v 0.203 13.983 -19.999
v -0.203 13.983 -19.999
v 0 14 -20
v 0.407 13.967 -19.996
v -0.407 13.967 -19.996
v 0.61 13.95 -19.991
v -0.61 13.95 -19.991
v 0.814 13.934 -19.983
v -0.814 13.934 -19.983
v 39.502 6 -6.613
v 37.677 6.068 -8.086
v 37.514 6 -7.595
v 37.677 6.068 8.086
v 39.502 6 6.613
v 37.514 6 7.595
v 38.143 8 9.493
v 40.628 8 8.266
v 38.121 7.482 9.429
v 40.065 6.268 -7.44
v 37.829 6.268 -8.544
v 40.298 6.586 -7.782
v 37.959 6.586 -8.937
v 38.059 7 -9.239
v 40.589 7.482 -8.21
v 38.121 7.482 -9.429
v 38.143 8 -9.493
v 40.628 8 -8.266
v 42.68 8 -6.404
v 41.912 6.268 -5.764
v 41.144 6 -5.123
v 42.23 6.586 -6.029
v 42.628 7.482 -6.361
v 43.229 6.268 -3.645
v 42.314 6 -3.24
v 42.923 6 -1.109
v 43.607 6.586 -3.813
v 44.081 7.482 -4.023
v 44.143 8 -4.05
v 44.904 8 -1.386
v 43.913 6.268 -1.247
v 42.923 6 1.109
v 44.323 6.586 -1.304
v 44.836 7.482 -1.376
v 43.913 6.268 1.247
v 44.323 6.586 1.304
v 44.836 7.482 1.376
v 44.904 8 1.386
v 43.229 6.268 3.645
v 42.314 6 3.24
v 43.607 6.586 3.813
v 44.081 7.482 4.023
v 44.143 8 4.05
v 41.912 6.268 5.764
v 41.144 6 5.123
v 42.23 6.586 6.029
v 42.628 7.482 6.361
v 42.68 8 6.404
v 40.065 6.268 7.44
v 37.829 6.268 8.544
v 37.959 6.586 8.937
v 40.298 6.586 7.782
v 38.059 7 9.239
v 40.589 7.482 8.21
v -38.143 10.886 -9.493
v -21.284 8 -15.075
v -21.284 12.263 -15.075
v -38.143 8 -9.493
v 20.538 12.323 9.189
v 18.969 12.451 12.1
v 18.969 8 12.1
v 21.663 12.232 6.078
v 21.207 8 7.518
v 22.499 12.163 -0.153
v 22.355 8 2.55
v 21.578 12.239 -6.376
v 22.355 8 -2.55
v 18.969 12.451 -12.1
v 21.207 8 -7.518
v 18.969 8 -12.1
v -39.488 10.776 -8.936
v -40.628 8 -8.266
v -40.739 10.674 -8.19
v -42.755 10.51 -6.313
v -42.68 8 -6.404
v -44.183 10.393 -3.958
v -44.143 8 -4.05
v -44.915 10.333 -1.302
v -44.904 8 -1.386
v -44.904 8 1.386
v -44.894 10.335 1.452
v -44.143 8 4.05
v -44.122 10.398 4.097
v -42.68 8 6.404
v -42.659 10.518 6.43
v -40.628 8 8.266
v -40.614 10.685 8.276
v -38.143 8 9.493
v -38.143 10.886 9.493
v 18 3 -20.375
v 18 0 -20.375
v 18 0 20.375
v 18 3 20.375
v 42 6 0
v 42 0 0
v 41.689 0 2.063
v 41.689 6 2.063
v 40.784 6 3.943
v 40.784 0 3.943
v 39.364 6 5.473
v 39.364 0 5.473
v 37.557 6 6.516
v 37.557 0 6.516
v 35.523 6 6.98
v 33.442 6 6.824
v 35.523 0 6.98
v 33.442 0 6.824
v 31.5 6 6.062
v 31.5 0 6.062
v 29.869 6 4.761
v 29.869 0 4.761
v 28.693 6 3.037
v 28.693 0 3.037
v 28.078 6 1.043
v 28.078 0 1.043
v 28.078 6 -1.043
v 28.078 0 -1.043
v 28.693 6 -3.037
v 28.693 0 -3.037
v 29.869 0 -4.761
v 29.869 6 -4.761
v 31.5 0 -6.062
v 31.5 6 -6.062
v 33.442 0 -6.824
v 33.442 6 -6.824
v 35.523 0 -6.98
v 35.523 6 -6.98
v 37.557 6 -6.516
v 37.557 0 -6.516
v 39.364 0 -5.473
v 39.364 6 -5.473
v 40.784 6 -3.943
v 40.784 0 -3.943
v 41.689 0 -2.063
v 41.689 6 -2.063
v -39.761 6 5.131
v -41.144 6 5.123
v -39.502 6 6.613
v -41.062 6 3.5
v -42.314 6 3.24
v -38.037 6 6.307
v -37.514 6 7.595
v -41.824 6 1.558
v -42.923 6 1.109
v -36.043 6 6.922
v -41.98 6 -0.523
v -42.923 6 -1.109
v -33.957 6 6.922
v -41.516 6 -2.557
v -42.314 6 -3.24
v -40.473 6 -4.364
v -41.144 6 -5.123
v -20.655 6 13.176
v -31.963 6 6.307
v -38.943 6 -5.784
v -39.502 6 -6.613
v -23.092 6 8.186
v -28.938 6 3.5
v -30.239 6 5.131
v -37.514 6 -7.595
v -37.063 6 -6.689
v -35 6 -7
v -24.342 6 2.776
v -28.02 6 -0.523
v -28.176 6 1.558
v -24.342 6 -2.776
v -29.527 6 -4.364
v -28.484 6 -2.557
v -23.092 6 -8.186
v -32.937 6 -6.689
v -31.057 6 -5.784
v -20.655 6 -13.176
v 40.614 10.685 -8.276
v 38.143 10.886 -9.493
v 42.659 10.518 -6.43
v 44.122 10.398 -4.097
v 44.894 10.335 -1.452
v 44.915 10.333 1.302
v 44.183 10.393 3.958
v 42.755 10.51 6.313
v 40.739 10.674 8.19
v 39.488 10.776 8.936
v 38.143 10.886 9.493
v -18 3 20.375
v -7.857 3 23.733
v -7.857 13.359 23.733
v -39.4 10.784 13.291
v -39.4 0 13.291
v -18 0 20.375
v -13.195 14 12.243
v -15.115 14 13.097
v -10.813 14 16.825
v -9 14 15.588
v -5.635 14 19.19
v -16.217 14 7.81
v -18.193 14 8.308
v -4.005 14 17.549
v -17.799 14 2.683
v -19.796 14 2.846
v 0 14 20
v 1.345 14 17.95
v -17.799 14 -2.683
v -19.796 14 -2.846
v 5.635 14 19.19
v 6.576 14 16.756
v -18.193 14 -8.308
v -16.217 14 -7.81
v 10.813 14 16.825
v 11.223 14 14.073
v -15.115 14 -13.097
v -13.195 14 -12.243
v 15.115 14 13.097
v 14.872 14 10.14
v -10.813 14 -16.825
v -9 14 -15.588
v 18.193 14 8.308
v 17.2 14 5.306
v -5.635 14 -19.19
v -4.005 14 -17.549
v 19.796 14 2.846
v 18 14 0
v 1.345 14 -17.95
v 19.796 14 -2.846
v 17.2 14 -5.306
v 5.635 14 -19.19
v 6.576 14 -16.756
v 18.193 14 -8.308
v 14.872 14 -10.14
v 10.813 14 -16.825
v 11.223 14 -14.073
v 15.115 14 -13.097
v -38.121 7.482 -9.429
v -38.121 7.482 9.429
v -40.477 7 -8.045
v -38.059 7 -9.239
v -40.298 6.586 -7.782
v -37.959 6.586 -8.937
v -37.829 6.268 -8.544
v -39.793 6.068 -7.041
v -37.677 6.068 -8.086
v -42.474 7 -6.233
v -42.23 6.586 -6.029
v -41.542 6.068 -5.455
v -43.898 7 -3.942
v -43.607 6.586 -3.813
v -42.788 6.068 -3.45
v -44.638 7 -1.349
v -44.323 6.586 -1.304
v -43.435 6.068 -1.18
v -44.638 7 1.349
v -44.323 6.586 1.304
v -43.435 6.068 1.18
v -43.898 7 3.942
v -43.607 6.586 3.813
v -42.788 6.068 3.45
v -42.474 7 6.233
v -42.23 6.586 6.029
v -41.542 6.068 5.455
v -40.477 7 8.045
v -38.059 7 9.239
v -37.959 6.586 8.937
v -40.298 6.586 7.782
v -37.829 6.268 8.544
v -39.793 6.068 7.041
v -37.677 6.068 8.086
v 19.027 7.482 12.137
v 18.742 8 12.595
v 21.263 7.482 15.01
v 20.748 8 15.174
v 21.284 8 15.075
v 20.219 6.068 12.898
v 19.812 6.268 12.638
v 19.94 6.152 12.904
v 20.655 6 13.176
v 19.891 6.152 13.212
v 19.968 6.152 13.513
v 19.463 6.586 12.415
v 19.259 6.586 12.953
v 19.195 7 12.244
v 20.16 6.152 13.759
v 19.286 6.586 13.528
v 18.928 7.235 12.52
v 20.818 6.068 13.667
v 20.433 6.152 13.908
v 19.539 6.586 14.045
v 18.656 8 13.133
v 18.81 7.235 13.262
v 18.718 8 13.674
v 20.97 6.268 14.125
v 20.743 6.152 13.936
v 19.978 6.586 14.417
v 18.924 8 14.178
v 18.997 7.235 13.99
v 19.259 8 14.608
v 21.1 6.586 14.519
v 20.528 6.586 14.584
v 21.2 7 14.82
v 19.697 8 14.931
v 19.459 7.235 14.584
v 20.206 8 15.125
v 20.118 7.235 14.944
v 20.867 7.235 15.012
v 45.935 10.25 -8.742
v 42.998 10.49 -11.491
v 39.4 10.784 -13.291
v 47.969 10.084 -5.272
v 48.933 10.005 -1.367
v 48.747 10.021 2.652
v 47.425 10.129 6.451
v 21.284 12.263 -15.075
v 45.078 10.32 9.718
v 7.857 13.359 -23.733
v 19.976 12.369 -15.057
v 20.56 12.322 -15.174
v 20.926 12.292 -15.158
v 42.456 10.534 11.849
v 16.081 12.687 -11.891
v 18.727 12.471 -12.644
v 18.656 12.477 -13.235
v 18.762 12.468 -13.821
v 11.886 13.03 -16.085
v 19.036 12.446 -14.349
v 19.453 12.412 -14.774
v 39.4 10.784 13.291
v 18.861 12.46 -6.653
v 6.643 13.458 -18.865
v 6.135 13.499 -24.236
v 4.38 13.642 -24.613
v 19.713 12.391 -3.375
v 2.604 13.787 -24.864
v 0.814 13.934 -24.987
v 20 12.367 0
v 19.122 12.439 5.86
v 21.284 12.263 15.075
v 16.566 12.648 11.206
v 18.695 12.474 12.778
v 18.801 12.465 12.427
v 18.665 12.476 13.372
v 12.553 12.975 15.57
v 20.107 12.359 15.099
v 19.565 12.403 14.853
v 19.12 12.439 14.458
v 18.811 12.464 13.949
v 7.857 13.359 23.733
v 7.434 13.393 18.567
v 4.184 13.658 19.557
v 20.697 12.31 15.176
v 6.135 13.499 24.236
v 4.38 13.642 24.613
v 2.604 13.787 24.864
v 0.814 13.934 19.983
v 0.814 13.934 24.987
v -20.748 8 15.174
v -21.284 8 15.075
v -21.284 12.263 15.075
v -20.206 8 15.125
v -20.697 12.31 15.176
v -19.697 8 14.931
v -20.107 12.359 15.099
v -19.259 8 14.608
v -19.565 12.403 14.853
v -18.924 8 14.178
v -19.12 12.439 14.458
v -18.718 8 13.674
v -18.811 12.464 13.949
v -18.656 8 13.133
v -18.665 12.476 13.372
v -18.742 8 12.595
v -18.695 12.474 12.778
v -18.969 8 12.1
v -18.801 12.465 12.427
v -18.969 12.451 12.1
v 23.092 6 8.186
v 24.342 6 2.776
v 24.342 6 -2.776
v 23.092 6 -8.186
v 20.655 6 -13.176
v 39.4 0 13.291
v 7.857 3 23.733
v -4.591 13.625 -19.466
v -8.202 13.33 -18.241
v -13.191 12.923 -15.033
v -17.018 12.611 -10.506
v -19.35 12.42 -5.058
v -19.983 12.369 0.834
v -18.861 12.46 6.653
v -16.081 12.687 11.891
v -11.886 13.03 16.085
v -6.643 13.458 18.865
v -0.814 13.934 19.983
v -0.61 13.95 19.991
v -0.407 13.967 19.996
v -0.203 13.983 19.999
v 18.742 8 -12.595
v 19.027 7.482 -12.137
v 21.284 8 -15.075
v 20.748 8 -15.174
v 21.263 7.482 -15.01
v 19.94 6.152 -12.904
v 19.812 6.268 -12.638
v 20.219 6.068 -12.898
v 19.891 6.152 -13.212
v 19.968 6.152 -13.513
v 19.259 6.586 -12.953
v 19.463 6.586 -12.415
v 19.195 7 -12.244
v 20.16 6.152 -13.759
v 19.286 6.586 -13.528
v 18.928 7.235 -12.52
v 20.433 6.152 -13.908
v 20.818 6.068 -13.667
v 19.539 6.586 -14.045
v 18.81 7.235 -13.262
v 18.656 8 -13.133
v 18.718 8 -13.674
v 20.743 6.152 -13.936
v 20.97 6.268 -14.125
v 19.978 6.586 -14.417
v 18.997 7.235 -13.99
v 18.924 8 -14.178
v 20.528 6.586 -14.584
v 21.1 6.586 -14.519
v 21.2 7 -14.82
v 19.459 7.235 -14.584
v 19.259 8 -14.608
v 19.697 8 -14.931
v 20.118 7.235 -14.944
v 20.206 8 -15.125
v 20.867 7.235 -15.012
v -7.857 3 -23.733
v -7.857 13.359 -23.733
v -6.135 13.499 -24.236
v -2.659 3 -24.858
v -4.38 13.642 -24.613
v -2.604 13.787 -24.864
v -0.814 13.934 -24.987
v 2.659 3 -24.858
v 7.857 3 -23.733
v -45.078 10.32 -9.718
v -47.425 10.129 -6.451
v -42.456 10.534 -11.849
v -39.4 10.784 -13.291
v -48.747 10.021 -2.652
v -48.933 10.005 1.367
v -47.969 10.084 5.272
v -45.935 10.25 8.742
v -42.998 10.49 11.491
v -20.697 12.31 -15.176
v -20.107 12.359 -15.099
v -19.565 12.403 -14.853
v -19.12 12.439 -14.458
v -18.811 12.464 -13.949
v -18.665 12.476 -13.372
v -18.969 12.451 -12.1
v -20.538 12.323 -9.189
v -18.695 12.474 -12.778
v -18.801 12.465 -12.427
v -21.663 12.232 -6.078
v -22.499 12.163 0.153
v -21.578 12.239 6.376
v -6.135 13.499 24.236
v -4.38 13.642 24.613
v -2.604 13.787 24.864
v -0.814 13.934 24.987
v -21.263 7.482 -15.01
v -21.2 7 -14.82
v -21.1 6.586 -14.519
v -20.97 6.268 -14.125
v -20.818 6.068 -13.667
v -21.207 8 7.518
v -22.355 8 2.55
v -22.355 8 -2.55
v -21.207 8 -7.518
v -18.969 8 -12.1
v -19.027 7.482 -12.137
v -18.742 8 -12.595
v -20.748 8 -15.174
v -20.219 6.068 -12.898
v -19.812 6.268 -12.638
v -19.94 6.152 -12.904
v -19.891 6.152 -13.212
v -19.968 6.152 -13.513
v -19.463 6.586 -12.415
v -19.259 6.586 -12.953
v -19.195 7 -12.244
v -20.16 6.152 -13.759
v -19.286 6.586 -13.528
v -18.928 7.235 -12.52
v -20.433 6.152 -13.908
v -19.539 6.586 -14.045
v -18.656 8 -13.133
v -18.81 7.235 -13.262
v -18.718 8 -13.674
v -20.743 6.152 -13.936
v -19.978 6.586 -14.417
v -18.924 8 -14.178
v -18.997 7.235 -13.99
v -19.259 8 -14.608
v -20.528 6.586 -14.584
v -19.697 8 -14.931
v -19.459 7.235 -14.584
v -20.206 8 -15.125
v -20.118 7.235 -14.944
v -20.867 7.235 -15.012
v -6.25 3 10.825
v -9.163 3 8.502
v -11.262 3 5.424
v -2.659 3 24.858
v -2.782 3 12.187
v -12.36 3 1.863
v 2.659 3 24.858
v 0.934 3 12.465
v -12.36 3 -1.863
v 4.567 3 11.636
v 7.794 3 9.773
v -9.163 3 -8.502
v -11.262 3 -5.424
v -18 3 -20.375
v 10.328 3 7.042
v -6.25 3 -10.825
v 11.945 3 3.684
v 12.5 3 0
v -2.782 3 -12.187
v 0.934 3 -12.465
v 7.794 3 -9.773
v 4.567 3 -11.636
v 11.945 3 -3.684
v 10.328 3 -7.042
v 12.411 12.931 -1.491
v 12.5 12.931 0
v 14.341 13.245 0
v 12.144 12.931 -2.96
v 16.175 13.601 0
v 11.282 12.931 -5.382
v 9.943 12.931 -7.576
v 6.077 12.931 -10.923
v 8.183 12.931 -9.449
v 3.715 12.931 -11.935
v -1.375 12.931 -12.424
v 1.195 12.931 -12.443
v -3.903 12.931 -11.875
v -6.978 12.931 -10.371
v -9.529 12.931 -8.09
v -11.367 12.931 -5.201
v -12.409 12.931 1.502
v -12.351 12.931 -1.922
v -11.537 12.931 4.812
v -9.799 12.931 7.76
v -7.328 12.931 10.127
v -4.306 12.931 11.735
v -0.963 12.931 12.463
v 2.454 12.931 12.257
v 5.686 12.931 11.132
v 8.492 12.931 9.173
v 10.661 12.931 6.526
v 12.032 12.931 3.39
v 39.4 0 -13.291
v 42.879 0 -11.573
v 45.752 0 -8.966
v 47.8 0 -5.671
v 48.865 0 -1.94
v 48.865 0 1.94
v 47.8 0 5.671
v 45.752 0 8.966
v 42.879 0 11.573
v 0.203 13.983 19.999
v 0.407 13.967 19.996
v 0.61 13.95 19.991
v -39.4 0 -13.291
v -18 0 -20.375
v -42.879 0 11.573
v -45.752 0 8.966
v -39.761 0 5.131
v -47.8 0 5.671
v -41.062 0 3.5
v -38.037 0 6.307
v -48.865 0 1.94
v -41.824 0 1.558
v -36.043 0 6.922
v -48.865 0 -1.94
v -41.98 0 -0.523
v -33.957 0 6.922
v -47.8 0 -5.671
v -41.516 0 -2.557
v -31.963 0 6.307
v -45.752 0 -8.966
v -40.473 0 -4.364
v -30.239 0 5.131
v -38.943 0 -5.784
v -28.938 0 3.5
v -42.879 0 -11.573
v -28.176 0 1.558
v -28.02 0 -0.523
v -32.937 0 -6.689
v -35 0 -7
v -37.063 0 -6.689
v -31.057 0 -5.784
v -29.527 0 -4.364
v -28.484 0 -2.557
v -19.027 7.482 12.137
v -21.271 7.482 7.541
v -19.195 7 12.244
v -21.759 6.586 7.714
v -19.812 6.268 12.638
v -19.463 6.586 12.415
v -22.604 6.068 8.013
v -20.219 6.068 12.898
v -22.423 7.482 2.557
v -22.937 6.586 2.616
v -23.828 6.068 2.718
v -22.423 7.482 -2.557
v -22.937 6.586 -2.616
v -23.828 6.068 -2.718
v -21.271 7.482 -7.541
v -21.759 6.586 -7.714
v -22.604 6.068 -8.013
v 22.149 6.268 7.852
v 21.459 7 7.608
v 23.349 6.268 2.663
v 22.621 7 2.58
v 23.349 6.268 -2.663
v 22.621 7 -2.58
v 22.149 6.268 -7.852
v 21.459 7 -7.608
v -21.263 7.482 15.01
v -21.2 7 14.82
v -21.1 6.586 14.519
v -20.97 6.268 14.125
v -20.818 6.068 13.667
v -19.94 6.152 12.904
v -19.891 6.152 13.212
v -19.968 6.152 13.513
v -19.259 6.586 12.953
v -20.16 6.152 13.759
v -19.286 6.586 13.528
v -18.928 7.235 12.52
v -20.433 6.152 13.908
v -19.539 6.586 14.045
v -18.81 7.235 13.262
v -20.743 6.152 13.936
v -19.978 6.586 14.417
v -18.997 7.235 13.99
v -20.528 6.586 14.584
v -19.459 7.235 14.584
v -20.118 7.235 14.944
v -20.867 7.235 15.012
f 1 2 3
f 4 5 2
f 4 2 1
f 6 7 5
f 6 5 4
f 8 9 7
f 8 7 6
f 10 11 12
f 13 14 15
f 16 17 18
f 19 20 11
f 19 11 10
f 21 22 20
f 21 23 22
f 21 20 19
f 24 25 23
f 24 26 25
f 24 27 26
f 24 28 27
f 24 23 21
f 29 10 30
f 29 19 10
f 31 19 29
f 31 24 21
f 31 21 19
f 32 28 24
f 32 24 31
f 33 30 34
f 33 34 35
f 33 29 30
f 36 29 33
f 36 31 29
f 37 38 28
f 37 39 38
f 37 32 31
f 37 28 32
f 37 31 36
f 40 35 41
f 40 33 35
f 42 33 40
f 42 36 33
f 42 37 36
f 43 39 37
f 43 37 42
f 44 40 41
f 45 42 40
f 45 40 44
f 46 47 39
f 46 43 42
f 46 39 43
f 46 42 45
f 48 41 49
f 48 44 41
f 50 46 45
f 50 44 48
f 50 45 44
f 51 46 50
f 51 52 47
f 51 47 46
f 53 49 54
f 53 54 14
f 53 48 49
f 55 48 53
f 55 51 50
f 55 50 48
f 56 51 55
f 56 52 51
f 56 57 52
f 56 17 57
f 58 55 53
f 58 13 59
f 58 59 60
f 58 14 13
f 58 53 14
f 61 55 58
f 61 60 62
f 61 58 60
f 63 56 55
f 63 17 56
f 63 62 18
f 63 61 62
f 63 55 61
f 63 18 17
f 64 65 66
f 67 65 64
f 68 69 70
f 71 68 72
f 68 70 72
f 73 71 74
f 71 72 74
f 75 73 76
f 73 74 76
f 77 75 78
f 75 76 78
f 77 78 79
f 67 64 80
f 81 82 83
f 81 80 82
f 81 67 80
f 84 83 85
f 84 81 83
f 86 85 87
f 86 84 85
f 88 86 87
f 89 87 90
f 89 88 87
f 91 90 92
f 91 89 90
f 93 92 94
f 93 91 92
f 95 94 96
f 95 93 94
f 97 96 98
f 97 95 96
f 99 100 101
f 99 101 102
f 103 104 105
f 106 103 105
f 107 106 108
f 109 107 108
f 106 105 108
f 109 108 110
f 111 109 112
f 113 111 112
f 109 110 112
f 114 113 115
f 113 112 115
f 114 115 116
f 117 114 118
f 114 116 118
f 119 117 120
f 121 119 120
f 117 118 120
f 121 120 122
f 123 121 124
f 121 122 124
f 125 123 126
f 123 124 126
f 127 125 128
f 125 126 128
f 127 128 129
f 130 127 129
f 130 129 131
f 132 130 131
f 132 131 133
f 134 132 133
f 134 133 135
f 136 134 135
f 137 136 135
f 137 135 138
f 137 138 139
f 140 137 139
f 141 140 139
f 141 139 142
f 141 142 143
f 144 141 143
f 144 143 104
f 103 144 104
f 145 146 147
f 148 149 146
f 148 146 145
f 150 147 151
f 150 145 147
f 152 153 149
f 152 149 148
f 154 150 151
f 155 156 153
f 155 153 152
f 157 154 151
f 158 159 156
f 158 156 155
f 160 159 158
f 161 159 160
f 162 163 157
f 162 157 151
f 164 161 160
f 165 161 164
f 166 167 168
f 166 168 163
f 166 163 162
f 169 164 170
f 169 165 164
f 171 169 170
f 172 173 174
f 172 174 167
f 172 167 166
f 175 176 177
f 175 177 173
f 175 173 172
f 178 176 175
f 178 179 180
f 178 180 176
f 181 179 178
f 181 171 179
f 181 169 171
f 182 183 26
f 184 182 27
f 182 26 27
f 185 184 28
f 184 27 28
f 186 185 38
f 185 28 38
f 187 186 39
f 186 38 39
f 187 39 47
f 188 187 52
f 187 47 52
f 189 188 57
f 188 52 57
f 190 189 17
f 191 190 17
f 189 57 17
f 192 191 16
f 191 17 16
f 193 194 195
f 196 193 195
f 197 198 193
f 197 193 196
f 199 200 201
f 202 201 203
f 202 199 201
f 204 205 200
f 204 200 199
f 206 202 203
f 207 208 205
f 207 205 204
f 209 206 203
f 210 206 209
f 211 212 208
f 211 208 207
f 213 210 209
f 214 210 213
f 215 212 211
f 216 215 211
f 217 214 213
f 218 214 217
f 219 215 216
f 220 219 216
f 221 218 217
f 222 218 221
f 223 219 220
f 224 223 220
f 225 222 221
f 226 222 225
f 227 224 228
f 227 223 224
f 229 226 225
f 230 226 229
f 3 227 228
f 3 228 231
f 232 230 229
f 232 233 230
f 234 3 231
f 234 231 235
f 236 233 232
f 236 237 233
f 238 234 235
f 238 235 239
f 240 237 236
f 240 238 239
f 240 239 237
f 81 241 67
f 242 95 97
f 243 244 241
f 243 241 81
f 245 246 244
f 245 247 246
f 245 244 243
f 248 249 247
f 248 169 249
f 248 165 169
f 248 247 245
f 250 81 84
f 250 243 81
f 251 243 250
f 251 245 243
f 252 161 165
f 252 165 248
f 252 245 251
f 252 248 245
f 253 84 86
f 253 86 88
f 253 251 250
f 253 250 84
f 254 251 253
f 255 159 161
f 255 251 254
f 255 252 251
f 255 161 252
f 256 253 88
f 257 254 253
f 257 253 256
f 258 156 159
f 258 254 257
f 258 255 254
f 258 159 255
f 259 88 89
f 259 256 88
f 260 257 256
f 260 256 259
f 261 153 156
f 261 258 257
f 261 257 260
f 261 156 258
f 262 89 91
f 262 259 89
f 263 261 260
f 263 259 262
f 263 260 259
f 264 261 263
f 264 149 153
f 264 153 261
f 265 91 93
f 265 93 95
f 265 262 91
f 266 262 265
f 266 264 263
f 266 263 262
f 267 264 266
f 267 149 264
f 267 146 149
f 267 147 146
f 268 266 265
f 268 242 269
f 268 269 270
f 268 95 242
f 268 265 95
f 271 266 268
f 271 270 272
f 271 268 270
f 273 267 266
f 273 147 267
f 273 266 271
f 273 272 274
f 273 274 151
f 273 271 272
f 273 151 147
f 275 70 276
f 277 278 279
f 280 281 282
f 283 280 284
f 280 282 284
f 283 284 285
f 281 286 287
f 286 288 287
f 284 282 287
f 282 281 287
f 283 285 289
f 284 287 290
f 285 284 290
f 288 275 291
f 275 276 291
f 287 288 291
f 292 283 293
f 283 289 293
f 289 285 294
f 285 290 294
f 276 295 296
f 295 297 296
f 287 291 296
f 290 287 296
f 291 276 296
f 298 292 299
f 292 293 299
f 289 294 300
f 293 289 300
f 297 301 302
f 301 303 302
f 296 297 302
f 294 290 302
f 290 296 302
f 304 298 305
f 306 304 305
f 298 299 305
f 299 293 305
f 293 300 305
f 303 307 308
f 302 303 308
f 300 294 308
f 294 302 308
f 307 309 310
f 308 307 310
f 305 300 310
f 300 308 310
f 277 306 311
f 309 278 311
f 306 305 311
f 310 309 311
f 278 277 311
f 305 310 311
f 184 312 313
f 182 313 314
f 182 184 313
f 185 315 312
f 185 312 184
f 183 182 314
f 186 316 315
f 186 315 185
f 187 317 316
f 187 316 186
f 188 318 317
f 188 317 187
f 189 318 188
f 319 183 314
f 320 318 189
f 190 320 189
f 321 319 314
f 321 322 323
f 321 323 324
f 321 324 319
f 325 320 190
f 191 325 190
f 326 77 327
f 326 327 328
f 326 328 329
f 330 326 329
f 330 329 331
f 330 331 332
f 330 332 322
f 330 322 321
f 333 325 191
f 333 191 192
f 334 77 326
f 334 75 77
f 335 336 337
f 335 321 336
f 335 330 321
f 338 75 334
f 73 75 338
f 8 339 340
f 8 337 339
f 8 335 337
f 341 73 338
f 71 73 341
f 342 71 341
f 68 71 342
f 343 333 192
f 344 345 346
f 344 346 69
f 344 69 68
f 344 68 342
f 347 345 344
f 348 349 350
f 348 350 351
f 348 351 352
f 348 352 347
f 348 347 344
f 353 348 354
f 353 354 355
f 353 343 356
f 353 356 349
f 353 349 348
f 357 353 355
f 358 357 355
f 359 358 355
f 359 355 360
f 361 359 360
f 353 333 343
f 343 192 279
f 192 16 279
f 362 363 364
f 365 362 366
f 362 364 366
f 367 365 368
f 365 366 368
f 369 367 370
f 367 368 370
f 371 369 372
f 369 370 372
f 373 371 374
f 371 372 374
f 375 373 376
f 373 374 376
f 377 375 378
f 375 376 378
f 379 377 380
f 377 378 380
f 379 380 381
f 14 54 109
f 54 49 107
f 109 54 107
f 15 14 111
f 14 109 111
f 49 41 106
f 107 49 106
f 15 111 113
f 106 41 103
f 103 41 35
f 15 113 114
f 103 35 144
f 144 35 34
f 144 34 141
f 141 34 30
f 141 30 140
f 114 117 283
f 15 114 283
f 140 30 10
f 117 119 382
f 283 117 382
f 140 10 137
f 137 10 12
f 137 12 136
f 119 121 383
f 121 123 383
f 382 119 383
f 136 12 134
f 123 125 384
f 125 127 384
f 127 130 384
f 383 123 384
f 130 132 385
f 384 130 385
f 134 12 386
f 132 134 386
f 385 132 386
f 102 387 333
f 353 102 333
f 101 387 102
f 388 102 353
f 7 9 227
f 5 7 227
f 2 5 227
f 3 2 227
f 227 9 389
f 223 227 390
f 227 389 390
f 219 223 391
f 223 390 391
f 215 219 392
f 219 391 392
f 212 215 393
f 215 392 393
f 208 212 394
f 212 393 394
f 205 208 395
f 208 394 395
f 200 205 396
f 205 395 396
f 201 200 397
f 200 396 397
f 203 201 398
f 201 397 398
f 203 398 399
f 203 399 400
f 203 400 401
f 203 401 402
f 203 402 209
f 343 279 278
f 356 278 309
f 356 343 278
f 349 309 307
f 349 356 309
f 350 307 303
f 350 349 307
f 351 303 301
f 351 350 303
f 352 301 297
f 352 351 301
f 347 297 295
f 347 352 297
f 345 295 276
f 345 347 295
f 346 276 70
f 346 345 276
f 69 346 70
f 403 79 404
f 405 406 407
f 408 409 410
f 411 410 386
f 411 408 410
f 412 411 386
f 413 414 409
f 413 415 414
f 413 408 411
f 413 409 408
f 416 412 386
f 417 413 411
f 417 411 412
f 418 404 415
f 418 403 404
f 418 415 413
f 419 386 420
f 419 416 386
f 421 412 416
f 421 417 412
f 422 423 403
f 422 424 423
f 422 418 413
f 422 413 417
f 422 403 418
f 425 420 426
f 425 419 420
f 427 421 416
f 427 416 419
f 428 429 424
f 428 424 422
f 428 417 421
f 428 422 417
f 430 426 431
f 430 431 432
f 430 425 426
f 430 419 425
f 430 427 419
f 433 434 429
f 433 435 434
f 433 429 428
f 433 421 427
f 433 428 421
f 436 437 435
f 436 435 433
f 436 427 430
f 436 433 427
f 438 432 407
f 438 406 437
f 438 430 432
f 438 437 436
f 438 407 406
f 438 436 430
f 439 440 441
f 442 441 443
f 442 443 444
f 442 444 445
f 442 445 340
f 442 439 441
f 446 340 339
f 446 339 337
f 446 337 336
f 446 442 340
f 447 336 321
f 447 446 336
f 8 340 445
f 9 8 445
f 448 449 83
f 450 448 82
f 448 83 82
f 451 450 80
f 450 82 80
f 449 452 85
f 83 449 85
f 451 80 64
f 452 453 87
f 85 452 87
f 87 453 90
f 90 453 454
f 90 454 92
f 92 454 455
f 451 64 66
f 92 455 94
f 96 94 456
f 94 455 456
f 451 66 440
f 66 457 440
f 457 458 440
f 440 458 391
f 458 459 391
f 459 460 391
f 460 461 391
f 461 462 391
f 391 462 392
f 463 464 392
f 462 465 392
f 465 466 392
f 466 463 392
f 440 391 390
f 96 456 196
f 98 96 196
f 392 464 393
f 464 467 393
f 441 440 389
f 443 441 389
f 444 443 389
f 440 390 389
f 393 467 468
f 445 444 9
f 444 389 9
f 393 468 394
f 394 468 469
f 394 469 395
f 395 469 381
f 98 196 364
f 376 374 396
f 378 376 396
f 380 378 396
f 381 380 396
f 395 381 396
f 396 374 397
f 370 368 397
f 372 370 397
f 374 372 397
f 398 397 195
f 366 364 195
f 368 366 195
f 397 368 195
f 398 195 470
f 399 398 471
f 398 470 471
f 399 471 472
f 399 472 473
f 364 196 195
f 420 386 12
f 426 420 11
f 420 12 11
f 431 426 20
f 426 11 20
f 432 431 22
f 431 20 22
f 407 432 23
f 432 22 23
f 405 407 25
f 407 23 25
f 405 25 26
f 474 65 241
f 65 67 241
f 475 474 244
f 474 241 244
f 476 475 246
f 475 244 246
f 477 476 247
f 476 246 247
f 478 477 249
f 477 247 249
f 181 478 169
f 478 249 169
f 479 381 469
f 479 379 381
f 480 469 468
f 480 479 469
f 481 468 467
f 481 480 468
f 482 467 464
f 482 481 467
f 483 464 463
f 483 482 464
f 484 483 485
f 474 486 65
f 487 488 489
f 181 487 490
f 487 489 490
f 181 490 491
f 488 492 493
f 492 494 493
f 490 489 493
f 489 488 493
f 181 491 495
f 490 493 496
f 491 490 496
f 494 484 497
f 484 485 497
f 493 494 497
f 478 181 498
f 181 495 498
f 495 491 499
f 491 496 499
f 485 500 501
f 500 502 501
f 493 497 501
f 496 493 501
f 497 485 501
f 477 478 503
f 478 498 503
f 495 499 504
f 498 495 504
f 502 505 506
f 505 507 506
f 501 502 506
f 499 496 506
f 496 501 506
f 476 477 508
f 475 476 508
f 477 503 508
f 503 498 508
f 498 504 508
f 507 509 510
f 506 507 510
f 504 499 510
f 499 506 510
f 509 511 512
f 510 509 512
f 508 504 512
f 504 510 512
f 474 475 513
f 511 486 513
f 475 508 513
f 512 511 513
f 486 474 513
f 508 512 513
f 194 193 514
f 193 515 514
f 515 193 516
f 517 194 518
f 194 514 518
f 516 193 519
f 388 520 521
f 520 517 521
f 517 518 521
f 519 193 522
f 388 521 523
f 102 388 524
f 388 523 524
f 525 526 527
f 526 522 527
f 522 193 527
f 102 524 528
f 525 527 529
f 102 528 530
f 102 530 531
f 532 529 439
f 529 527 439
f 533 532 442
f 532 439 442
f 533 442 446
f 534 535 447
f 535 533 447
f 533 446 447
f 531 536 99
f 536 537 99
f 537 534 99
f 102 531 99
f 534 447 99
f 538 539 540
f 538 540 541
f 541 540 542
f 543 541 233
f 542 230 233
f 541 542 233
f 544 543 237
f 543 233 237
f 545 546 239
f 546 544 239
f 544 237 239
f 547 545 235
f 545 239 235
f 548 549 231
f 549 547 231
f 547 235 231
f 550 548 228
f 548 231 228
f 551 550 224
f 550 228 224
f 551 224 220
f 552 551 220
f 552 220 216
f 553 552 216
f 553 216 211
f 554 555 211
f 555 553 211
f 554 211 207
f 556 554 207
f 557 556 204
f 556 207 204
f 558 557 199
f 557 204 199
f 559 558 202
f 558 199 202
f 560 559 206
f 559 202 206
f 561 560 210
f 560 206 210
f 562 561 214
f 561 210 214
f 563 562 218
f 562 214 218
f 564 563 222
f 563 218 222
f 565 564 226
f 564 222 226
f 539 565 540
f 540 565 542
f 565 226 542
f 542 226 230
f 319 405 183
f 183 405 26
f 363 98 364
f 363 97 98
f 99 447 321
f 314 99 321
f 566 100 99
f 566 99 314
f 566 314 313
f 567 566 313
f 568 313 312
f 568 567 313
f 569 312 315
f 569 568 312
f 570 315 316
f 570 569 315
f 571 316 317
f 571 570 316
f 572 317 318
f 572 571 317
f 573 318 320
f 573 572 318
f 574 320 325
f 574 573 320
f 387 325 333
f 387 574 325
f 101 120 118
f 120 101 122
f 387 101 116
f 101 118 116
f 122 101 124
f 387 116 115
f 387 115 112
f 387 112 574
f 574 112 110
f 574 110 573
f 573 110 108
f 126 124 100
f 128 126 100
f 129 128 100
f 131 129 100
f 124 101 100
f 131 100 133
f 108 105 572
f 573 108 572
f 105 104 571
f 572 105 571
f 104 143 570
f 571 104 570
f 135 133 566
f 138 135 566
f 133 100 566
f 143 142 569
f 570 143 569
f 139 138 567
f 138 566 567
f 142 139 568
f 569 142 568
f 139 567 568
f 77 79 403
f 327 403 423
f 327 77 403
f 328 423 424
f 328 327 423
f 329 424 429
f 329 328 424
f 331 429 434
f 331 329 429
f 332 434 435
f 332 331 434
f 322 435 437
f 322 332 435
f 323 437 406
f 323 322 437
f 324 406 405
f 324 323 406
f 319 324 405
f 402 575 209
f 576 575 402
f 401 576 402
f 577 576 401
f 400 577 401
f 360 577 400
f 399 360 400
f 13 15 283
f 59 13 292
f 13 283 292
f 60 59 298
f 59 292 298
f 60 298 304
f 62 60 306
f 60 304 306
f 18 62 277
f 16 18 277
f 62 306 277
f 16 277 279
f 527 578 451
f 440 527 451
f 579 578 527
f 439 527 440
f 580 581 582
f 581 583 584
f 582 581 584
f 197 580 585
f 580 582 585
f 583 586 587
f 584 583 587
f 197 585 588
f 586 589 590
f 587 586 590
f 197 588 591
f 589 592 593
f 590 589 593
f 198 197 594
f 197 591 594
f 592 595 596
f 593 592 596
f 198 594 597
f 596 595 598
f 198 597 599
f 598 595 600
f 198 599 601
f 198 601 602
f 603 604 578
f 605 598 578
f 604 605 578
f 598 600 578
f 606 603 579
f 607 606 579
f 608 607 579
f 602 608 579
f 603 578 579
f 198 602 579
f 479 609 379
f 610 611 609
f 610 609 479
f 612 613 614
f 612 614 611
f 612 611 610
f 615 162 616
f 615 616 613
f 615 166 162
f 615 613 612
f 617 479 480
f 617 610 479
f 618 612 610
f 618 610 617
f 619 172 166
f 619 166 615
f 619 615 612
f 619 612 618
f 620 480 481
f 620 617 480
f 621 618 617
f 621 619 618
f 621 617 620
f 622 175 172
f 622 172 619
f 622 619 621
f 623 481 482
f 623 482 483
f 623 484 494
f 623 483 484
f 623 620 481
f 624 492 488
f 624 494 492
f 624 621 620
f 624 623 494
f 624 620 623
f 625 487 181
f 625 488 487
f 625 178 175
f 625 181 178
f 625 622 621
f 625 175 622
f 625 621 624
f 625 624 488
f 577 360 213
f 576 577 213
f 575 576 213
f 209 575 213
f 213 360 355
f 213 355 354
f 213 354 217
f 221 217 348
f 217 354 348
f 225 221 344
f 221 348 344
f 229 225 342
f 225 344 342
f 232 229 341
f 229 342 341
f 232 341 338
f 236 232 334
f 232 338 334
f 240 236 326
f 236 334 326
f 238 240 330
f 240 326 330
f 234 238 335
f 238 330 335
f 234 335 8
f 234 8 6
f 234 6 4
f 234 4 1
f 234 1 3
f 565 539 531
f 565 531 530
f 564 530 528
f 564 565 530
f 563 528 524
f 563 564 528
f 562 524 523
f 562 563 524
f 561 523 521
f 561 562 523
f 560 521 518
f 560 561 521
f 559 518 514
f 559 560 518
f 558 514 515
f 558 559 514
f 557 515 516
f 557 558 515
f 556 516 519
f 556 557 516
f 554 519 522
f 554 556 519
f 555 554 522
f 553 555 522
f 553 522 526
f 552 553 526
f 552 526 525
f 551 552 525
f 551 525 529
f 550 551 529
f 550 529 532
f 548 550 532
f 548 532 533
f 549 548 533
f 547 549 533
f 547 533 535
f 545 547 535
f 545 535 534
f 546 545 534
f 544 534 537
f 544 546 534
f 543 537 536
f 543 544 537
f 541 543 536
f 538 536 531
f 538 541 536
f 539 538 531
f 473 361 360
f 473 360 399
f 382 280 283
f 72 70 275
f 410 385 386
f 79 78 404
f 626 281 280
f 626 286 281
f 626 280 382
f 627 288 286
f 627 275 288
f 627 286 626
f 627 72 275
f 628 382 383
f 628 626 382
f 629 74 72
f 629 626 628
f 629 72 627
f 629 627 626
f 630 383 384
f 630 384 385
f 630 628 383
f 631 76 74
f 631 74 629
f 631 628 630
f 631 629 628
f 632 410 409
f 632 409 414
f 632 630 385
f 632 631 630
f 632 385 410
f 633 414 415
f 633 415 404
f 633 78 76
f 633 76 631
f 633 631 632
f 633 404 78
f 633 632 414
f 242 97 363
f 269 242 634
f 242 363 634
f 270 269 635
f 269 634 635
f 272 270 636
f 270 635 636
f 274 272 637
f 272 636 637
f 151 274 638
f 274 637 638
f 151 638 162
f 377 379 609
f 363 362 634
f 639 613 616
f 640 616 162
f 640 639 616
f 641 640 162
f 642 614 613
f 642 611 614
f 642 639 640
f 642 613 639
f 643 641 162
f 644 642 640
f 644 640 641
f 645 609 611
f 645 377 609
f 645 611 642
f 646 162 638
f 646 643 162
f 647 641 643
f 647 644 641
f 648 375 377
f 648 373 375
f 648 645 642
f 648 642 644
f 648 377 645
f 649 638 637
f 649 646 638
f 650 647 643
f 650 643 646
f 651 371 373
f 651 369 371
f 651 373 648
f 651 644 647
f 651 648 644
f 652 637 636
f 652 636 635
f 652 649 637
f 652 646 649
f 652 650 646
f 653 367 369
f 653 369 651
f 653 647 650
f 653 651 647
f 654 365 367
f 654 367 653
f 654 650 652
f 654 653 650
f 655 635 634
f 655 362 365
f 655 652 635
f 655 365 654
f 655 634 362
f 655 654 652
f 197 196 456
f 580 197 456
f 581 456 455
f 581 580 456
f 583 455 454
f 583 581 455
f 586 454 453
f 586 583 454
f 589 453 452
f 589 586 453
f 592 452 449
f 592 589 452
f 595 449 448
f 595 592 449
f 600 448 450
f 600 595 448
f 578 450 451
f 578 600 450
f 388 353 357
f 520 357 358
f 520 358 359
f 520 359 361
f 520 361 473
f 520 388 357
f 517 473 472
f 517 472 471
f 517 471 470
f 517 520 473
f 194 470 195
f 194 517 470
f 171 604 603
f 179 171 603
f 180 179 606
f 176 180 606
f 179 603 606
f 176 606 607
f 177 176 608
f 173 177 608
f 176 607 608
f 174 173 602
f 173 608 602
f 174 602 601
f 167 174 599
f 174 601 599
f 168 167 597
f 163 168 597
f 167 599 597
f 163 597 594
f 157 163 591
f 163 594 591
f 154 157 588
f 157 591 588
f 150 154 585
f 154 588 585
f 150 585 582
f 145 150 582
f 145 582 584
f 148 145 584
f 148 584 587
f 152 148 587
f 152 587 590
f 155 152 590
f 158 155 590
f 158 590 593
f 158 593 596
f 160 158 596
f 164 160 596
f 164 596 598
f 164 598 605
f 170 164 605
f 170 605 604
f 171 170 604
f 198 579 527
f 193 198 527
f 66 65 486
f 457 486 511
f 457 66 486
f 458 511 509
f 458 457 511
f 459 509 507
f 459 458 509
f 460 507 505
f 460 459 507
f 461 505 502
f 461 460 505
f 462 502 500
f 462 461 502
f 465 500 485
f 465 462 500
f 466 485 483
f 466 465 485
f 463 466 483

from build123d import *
from build123d.topology import SkipClean

# Parameters (mm, degrees)
EXTRUDE_1_DEPTH          = 14
CUT_EXTRUDE_1_DEPTH      = 57.762663785
SKETCH_4_R               = 7
CUT_EXTRUDE_2_DEPTH      = 57.762663785
CUT_EXTRUDE_START        = 6
CUT_EXTRUDE_3_DEPTH      = 51.762663785
SKETCH_7_R               = 20
EXTRUDE_2_DEPTH          = 14
CUT_EXTRUDE_4_DEPTH      = 57.762663785
CUT_EXTRUDE_4_DEPTH_BACK = 57.762663785
SKETCH_6_W               = 36
SKETCH_6_H               = 3
CUT_EXTRUDE_5_DEPTH      = 57.098128311
CUT_EXTRUDE_5_DEPTH_BACK = 57.098128311
SKETCH_9_R               = 12.5
FILLET_1_R               = 10
FILLET_4_R               = 2


with BuildPart() as part:
    # 草图2 → 凸台-拉伸1 (new body)
    with BuildSketch(Plane(origin=(0, 0, 0), x_dir=(1, 0, 0), z_dir=(0, 1, 0))):
        with BuildLine():
            Line((7.857142857, 23.733211037), (39.4, 13.290598181))
            ThreePointArc((39.4, 13.290598181), (49, 0), (39.4, -13.290598181))
            Line((39.4, -13.290598181), (7.857142857, -23.733211037))
            ThreePointArc((7.857142857, -23.733211037), (0, -25), (-7.857142857, -23.733211037))
            Line((-7.857142857, -23.733211037), (-39.4, -13.290598181))
            ThreePointArc((-39.4, -13.290598181), (-49, 0), (-39.4, 13.290598181))
            Line((-39.4, 13.290598181), (-7.857142857, 23.733211037))
            ThreePointArc((-7.857142857, 23.733211037), (0, 25), (7.857142857, 23.733211037))
        make_face()
    extrude(amount=EXTRUDE_1_DEPTH)

    # 草图3 → 切除-拉伸1 (cut, symmetric)
    with BuildSketch(Plane.XY):
        Polygon((-255.331422272, -6.84338141), (-49, 10), (0, 14), (206.331422272, 30.84338141), (172.644659452, 443.506225953), (-289.018185091, 405.819463133), align=None)
    cut_extrude_1 = extrude(amount=CUT_EXTRUDE_1_DEPTH, both=True, mode=Mode.SUBTRACT)

    # 镜向1: 切除-拉伸1 across plane
    add(cut_extrude_1.mirror(Plane(origin=(0, 0, 0), x_dir=(0, 0, 1), z_dir=(1, 0, 0))), mode=Mode.SUBTRACT)

    # 草图4 → 切除-拉伸2 (cut, through all)
    with BuildSketch(Plane.XZ):
        with Locations(Location((-35, 0, 0), (0, 0, 270))):
            Circle(SKETCH_4_R)
        with Locations((35, 0)):
            Circle(SKETCH_4_R)
    extrude(amount=-CUT_EXTRUDE_2_DEPTH, mode=Mode.SUBTRACT)

    # 草图5 → 切除-拉伸3 (cut, through all)
    with BuildSketch(Plane(origin=(0, 0, 0), x_dir=(1, 0, 0), z_dir=(0, 1, 0)).offset(CUT_EXTRUDE_START)):
        with BuildLine():
            Line((-38.142857143, -9.493284415), (-14.26843517, -17.397176719))
            ThreePointArc((-14.26843517, -17.397176719), (-22.5, 0), (-14.26843517, 17.397176719))
            Line((-14.26843517, 17.397176719), (-38.142857143, 9.493284415))
            ThreePointArc((-38.142857143, 9.493284415), (-45, 0), (-38.142857143, -9.493284415))
        make_face()
    cut_extrude_3 = extrude(amount=CUT_EXTRUDE_3_DEPTH, mode=Mode.SUBTRACT)

    # 镜向2: 切除-拉伸3 across plane
    add(cut_extrude_3.mirror(Plane(origin=(0, 0, 0), x_dir=(0, 0, 1), z_dir=(1, 0, 0))), mode=Mode.SUBTRACT)

    # 草图7 → 凸台-拉伸2 (add)
    with BuildSketch(Plane(origin=(0, 0, 0), x_dir=(1, 0, 0), z_dir=(0, 1, 0))):
        Circle(SKETCH_7_R)
    extrude(amount=EXTRUDE_2_DEPTH)

    # 草图6 → 切除-拉伸4 (cut, two sides: drawn at the far end of the back side and taken through both)
    with BuildSketch(Plane.XY.offset(-CUT_EXTRUDE_4_DEPTH_BACK)):
        with Locations((0, 1.5)):
            Rectangle(SKETCH_6_W, SKETCH_6_H)
    extrude(amount=CUT_EXTRUDE_4_DEPTH + CUT_EXTRUDE_4_DEPTH_BACK, mode=Mode.SUBTRACT)

    # 草图8 → 切除-旋转3 (revolve, cut)
    with SkipClean():  # the faces are left unmerged after this step: merging them gives an invalid solid
        with BuildSketch(Plane.XY):
            with BuildLine():
                ThreePointArc((0, 11.94870108), (9.058253519, 12.463180114), (18, 14))
                Line((18, 14), (0, 14))
                Line((0, 14), (0, 11.94870108))
            make_face()
            with BuildLine():
                Line((0, 11.94870108), (0, 14))
                Line((0, 14), (-18, 14))
                ThreePointArc((-18, 14), (-9.058253519, 12.463180114), (0, 11.94870108))
            make_face()
        revolve(axis=Axis((0, -0.298834831, 0), (0, 1, 0)), mode=Mode.SUBTRACT)
    add(part.part.scale(1), mode=Mode.REPLACE)  # the faces are merged on a copy

    # 草图9 → 切除-拉伸5 (cut, two sides: drawn at the far end of the back side and taken through both)
    with BuildSketch(Plane.XZ.offset(-3).offset(-CUT_EXTRUDE_5_DEPTH_BACK)):
        Circle(SKETCH_9_R)
    extrude(amount=CUT_EXTRUDE_5_DEPTH + CUT_EXTRUDE_5_DEPTH_BACK, mode=Mode.SUBTRACT)

    # 圆角1
    # the kernel refuses this fillet: 10 mm, written as the material it takes off along each edge
    with BuildSketch(Plane(origin=(0, 14, 17.959183673), x_dir=(0.9966846158226077, -0.08136200945491137, 0), z_dir=(0, 0, 1))) as fillet_1_piece_1_section:
        with BuildLine():
            CenterArc((FILLET_1_R * 0.0816326530612, -FILLET_1_R), FILLET_1_R, 90, 9.333716743)
            Line((-FILLET_1_R * 0.080551873211, -FILLET_1_R * 0.0132395531651), (0, 0))
            Line((0, 0), (FILLET_1_R * 0.0816326530612, 0))
        make_face()
    fillet_1_piece_1 = extrude(amount=9.081632653, mode=Mode.PRIVATE)
    fillet_1_piece_1 = fillet_1_piece_1 - Plane(origin=(0, 13.973401813, 0), x_dir=(1, 0, 0), z_dir=(0, -1, 0)) * Cylinder(20, 22, mode=Mode.PRIVATE)
    add(fillet_1_piece_1, mode=Mode.SUBTRACT)
    with BuildSketch(Plane(origin=(0, 14, -27.040816327), x_dir=(0.9966846158226077, -0.08136200945491137, 0), z_dir=(0, 0, 1))) as fillet_1_piece_2_section:
        with BuildLine():
            CenterArc((FILLET_1_R * 0.0816326530612, -FILLET_1_R), FILLET_1_R, 90, 9.333716743)
            Line((-FILLET_1_R * 0.080551873211, -FILLET_1_R * 0.0132395531651), (0, 0))
            Line((0, 0), (FILLET_1_R * 0.0816326530612, 0))
        make_face()
    fillet_1_piece_2 = extrude(amount=9.081632653, mode=Mode.PRIVATE)
    fillet_1_piece_2 = fillet_1_piece_2 - Plane(origin=(0, 13.973401813, 0), x_dir=(1, 0, 0), z_dir=(0, -1, 0)) * Cylinder(20, 22, mode=Mode.PRIVATE)
    add(fillet_1_piece_2, mode=Mode.SUBTRACT)

    # 圆角4
    fillet_4_edges = [part.edges().sort_by_distance(p)[0] for p in [
        (26.205646157, 6, 13.445230567),
        (45, 6, 0),
        (-26.205646157, 6, 13.445230567),
        (-45, 6, 0),
        (-14.26843517, 9.417614891, 17.397176719),
        (14.26843517, 9.417614891, 17.397176719),
        (26.205646157, 6, -13.445230567),
        (14.26843517, 9.417614891, -17.397176719),
        (22.5, 6, 0),
        (-14.26843517, 9.417614891, -17.397176719),
        (-22.5, 6, 0),
        (-26.205646157, 6, -13.445230567),
    ]]
    fillet(fillet_4_edges, radius=FILLET_4_R)


solid = part.part
